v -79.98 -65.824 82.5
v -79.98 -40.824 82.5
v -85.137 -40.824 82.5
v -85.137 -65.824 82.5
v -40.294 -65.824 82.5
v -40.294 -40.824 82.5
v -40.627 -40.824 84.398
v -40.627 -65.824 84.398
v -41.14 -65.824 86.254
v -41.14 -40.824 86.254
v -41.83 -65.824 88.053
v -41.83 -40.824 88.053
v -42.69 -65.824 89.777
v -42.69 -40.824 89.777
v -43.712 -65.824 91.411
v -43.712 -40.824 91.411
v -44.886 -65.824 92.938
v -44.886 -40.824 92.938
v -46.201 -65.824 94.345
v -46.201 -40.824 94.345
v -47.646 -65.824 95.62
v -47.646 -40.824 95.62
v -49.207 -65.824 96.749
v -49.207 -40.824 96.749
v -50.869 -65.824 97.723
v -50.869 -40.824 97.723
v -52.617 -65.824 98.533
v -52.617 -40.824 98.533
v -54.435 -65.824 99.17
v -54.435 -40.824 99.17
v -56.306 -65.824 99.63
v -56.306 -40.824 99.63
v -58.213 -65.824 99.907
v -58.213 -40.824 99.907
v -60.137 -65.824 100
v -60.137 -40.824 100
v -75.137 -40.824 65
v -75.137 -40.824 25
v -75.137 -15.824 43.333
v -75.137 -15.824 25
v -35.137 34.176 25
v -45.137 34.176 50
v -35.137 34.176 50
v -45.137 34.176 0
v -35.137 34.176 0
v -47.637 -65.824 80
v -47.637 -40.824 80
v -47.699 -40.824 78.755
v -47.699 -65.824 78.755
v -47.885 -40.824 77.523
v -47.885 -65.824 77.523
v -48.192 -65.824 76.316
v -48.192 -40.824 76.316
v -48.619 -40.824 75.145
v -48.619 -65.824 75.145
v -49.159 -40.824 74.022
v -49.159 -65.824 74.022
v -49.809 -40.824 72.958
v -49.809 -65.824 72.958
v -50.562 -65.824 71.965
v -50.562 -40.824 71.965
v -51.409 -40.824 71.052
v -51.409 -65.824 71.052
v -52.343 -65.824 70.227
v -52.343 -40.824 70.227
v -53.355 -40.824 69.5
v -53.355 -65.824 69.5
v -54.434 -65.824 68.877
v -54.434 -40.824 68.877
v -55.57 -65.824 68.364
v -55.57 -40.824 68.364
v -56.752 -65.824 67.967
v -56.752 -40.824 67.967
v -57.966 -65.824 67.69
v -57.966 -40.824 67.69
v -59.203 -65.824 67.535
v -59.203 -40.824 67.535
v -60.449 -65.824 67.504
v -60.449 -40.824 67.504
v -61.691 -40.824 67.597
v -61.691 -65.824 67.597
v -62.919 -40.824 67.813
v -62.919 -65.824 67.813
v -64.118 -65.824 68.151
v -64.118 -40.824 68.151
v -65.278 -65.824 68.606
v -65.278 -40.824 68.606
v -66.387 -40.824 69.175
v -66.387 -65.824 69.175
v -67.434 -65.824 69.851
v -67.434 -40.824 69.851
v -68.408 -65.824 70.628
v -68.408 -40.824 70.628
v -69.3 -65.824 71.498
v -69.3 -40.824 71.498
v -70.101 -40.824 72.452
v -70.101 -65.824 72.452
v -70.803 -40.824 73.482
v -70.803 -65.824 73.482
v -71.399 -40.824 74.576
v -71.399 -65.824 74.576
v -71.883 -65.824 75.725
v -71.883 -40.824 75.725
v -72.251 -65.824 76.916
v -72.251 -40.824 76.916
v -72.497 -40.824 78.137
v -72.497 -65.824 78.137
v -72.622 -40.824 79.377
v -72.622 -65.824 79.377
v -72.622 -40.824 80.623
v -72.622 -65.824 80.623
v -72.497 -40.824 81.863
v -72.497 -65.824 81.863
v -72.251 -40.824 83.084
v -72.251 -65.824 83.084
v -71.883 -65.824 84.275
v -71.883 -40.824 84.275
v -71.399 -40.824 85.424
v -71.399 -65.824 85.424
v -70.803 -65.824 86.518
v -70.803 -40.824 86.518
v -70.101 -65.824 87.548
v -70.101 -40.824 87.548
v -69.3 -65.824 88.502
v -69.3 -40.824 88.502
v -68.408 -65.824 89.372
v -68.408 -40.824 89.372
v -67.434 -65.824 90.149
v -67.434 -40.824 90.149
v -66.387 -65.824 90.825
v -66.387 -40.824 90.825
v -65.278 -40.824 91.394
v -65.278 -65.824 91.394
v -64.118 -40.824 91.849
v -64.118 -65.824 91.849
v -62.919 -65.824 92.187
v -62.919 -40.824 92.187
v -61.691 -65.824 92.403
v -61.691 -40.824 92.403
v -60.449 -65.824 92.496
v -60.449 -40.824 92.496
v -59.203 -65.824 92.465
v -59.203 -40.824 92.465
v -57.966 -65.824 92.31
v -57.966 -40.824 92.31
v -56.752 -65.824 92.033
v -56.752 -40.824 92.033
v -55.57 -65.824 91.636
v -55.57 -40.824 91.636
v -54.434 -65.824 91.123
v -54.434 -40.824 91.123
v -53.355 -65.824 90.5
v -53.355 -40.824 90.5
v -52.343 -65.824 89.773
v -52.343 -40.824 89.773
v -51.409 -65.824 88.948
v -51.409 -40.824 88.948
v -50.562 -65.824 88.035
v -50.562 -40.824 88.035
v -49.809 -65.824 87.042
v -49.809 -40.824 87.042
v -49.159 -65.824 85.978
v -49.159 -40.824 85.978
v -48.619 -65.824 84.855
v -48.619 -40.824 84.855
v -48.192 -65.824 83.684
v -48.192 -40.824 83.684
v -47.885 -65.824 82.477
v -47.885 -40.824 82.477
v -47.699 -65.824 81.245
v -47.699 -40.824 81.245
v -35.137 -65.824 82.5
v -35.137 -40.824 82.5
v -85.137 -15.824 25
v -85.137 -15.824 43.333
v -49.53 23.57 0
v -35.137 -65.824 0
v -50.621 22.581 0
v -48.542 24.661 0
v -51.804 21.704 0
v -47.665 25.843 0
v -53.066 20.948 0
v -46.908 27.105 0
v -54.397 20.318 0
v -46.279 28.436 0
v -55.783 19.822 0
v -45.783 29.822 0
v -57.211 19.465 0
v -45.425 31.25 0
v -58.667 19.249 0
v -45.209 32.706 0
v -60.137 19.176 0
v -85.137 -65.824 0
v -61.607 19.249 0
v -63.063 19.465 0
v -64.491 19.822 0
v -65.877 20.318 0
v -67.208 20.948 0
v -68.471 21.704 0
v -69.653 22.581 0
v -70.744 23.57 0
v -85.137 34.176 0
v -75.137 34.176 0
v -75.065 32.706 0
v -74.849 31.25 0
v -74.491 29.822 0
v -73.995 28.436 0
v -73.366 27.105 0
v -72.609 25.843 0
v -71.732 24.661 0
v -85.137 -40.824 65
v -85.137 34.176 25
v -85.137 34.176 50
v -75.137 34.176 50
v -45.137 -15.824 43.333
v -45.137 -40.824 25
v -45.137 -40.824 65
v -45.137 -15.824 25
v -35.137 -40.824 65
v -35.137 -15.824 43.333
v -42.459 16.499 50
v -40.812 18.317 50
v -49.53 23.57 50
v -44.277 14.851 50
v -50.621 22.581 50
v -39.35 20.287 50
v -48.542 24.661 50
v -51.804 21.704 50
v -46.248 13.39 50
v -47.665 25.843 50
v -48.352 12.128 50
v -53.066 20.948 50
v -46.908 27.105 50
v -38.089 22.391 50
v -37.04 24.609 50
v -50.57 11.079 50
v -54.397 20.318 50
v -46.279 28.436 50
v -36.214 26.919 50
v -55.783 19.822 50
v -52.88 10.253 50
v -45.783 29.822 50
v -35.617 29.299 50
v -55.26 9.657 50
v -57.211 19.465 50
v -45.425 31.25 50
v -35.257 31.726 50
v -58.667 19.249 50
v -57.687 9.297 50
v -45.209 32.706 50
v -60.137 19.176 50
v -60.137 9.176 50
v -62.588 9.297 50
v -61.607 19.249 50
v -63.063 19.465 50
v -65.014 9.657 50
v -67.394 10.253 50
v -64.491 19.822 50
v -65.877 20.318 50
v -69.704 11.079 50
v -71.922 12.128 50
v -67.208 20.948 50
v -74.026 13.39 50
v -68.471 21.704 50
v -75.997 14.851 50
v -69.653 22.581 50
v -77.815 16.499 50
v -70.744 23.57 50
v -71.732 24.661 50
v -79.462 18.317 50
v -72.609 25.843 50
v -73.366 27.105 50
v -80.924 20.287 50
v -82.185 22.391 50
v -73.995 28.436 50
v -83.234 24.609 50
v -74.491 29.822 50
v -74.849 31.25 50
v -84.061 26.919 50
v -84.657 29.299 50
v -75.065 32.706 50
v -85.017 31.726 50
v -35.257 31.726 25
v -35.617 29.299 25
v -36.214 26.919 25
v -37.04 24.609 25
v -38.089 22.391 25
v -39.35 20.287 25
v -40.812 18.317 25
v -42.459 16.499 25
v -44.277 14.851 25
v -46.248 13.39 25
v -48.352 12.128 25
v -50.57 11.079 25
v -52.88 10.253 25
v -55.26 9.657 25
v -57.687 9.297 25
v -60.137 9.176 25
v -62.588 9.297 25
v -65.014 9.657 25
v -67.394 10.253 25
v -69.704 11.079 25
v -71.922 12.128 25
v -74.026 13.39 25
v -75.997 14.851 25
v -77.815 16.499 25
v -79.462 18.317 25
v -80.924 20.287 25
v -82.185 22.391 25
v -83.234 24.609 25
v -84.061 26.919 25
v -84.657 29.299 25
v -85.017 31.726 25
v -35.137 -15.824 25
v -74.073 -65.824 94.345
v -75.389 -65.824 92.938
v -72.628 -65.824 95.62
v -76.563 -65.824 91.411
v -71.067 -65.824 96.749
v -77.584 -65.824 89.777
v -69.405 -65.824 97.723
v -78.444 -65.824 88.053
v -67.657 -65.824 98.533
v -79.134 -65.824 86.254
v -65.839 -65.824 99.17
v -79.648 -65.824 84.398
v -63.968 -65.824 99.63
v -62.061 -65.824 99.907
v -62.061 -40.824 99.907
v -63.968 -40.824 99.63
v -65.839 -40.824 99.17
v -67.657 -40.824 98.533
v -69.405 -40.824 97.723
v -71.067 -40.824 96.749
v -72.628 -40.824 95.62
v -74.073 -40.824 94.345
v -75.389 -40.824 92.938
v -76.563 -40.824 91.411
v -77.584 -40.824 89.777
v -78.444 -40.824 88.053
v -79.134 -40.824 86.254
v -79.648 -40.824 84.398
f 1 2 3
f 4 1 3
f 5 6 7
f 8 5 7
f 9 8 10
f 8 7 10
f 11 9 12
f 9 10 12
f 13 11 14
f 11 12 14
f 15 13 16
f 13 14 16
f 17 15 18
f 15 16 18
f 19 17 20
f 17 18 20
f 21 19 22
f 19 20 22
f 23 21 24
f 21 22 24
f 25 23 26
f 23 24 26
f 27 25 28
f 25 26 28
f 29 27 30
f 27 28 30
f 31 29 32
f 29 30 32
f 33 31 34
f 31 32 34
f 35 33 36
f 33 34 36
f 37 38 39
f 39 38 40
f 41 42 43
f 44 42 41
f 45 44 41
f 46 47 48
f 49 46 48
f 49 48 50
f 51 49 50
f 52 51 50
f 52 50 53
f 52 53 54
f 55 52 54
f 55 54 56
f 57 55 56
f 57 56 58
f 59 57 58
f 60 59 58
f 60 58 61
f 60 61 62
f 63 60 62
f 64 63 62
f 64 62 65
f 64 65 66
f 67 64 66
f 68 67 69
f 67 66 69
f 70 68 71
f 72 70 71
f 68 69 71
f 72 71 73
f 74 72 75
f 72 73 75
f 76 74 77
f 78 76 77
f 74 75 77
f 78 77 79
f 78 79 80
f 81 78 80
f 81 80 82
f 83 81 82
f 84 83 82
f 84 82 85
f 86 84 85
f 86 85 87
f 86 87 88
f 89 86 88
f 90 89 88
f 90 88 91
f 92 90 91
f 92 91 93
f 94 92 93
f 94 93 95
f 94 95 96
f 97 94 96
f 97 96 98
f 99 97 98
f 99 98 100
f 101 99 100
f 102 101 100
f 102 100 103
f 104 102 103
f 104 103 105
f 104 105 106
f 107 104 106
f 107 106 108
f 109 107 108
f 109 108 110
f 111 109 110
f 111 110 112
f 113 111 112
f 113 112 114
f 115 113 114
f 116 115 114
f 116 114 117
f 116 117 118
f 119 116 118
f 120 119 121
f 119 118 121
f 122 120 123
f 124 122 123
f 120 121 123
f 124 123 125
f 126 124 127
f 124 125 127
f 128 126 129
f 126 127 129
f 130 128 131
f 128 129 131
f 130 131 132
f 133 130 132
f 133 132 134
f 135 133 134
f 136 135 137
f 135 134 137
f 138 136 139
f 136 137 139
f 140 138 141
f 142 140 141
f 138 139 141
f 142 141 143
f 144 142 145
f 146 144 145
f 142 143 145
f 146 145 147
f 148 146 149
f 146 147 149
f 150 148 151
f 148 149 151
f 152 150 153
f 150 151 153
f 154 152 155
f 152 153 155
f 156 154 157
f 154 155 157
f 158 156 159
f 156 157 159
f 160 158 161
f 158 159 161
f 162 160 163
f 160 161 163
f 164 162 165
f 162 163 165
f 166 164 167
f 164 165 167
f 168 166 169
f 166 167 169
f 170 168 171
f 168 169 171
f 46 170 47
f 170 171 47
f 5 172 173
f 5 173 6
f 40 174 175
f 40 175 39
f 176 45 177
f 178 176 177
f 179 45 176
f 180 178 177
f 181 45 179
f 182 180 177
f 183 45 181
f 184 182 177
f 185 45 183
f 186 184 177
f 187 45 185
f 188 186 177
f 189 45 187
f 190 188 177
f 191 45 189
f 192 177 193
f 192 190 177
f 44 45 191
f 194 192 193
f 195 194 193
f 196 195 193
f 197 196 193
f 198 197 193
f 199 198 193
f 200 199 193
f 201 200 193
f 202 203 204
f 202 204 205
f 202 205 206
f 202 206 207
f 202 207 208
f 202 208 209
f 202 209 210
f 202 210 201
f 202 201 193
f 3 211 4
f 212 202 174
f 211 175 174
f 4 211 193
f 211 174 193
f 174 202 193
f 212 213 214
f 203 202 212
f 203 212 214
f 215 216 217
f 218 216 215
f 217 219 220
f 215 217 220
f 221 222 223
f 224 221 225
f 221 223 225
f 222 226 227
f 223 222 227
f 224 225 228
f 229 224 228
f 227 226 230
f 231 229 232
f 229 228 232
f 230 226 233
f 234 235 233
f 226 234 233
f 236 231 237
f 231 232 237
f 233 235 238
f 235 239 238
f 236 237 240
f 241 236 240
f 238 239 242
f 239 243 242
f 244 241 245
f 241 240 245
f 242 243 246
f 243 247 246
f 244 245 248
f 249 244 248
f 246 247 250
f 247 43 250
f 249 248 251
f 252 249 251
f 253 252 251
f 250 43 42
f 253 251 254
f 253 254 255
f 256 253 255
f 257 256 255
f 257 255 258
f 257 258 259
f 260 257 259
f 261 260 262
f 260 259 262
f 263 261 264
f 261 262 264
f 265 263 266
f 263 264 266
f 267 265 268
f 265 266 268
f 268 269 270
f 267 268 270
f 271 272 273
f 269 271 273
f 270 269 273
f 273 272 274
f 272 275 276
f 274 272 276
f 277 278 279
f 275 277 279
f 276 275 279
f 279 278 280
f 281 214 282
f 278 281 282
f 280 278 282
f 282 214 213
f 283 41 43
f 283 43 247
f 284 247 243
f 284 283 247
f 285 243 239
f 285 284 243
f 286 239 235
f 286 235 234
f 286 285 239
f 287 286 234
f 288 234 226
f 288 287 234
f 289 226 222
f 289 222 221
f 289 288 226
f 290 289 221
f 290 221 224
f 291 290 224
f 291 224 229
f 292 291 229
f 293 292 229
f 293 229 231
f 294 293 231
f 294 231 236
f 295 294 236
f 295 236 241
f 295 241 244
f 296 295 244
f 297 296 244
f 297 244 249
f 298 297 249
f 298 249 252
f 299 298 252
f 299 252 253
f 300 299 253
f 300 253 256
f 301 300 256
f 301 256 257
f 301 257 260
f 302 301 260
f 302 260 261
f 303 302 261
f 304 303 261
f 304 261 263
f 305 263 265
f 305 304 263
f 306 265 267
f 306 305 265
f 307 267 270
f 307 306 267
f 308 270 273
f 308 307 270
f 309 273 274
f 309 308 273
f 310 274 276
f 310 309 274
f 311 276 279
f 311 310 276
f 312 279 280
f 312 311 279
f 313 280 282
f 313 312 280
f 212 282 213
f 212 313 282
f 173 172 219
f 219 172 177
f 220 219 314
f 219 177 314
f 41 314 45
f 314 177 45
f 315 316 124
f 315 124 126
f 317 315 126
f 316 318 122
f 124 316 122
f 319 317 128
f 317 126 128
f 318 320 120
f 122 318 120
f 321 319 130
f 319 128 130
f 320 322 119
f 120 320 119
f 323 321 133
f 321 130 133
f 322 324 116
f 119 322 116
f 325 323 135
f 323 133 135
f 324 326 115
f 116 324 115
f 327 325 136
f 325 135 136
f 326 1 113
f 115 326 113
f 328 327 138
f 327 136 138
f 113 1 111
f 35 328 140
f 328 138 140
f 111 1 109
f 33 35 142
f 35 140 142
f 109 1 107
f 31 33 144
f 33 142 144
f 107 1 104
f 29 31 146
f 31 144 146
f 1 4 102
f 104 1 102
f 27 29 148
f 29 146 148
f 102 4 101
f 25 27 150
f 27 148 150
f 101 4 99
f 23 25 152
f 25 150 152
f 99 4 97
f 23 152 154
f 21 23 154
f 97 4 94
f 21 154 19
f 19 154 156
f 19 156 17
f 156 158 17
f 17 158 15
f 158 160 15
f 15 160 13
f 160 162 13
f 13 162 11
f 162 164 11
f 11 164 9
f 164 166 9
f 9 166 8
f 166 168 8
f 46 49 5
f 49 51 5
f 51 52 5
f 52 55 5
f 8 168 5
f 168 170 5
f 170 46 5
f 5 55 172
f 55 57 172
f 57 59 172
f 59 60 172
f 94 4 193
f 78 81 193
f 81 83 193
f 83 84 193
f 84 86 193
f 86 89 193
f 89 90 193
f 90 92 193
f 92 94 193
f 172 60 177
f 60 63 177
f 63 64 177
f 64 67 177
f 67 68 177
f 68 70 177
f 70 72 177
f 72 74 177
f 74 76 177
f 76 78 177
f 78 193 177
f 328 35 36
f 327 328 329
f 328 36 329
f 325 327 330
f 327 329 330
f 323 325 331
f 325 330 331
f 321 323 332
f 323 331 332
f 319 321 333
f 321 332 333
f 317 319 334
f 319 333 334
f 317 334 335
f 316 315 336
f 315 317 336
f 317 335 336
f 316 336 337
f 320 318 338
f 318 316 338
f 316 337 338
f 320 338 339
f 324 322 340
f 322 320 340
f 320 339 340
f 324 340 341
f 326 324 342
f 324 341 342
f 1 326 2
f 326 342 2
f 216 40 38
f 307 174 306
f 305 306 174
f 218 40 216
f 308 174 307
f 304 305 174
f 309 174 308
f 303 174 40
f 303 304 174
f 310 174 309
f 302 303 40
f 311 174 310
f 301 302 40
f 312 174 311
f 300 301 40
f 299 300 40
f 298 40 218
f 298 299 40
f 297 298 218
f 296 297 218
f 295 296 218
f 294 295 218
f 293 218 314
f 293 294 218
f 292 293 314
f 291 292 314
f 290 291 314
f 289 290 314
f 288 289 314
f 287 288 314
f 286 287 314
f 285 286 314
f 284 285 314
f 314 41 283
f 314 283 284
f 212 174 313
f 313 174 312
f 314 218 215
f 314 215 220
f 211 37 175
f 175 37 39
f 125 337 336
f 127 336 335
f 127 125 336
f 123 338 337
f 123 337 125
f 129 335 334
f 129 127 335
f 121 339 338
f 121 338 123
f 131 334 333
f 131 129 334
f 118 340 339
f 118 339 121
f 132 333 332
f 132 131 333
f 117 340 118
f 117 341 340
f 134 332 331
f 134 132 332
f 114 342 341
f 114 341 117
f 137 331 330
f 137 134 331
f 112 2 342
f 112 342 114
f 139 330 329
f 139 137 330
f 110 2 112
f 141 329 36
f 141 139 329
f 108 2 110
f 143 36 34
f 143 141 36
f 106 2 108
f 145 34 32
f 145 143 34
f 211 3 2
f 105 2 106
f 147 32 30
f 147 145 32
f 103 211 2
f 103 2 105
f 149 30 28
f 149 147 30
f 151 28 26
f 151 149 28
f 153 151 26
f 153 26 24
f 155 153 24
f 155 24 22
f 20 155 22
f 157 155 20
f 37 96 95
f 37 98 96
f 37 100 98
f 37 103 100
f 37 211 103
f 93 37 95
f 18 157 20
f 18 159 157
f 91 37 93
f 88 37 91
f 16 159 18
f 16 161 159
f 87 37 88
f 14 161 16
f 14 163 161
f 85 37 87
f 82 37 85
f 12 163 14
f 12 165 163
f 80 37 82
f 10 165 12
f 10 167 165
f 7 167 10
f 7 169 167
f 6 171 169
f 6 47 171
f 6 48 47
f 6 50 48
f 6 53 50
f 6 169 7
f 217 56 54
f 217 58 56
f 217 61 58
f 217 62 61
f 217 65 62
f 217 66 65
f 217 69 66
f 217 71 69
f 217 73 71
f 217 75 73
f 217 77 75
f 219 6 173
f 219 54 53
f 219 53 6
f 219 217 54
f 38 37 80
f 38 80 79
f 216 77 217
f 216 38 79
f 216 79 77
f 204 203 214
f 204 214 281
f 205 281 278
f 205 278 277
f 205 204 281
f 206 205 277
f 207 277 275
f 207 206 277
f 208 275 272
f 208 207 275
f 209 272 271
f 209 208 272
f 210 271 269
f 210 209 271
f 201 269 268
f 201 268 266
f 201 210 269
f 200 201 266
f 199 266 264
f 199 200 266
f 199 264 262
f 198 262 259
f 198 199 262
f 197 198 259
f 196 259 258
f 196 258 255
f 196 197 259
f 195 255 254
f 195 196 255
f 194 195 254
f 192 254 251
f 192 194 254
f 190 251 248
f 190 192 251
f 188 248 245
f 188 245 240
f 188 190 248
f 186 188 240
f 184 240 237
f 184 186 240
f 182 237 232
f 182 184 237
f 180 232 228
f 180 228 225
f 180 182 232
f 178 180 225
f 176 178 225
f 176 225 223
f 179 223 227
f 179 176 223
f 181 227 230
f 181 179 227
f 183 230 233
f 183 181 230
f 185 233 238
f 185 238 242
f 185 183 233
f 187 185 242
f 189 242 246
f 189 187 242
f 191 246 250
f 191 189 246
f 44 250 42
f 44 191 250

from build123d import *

# Parameters (mm, degrees)
BOSS_EXTRUDE2_DEPTH = 100
SKETCH1_4_W         = 10
SKETCH1_4_H         = 25
BOSS_EXTRUDE3_DEPTH = 65
BOSS_EXTRUDE4_DEPTH = 25
BOSS_EXTRUDE5_DEPTH = 50
SKETCH4_R           = 12.5
CUT_EXTRUDE1_DEPTH  = 56
CUT_EXTRUDE2_DEPTH  = 56


with BuildPart() as part:
    # Sketch1 → Boss-Extrude2 (new body)
    with BuildSketch(Plane.XY):
        Polygon((-85.137096774, -40.82358871), (-85.137096774, -65.82358871), (-35.137096774, -65.82358871), (-35.137096774, -40.82358871), (-45.137096774, -40.82358871), (-75.137096774, -40.82358871), align=None)
    extrude(amount=BOSS_EXTRUDE2_DEPTH)

    # Sketch1<4> → Boss-Extrude3 (add)
    with BuildSketch(Plane.XY):
        with Locations((-80.137096774, -28.32358871)):
            Rectangle(SKETCH1_4_W, SKETCH1_4_H)
        with Locations((-40.137096774, -28.32358871)):
            Rectangle(SKETCH1_4_W, SKETCH1_4_H)
    extrude(amount=BOSS_EXTRUDE3_DEPTH)

    # Sketch1<5> → Boss-Extrude4 (add)
    with BuildSketch(Plane.XY):
        with BuildLine():
            Line((-75.137096774, -15.82358871), (-75.137096774, -40.82358871))
            Line((-75.137096774, -40.82358871), (-45.137096774, -40.82358871))
            Line((-45.137096774, -40.82358871), (-45.137096774, -15.82358871))
            Line((-45.137096774, -15.82358871), (-35.137096774, -15.82358871))
            Line((-35.137096774, -15.82358871), (-35.137096774, 34.17641129))
            ThreePointArc((-35.137096774, 34.17641129), (-60.137096774, 9.17641129), (-85.137096774, 34.17641129))
            Line((-85.137096774, 34.17641129), (-85.137096774, -15.82358871))
            Line((-85.137096774, -15.82358871), (-75.137096774, -15.82358871))
        make_face()
    extrude(amount=BOSS_EXTRUDE4_DEPTH)

    # Sketch1<6> → Boss-Extrude5 (add)
    with BuildSketch(Plane.XY):
        with BuildLine():
            Line((-75.137096774, 34.17641129), (-85.137096774, 34.17641129))
            ThreePointArc((-85.137096774, 34.17641129), (-60.137096774, 9.17641129), (-35.137096774, 34.17641129))
            Line((-35.137096774, 34.17641129), (-45.137096774, 34.17641129))
            ThreePointArc((-45.137096774, 34.17641129), (-60.137096774, 19.17641129), (-75.137096774, 34.17641129))
        make_face()
    extrude(amount=BOSS_EXTRUDE5_DEPTH)

    # Sketch4 → Cut-Extrude1 (cut)
    with BuildSketch(Plane(origin=(0, -40.82358871, 0), x_dir=(1, 0, 0), z_dir=(0, 1, 0))):
        with BuildLine():
            Line((-35.137096774, -100), (-35.137096774, -82.5))
            Line((-35.137096774, -82.5), (-40.293961941, -82.5))
            ThreePointArc((-40.293961941, -82.5), (-46.908340219, -95), (-60.137096774, -100))
            Line((-60.137096774, -100), (-35.137096774, -100))
        make_face()
        with BuildLine():
            Line((-85.137096774, -100), (-60.137096774, -100))
            ThreePointArc((-60.137096774, -100), (-73.36585333, -95), (-79.980231607, -82.5))
            Line((-79.980231607, -82.5), (-85.137096774, -82.5))
            Line((-85.137096774, -82.5), (-85.137096774, -100))
        make_face()
        with Locations((-60.137096774, -80)):
            Circle(SKETCH4_R)
    extrude(amount=-CUT_EXTRUDE1_DEPTH, mode=Mode.SUBTRACT)

    # Sketch7 → Cut-Extrude2 (cut)
    with BuildSketch(Plane(origin=(-35.137096774, 0, 0), x_dir=(0, 0, -1), z_dir=(1, 0, 0))):
        Polygon((-65, -15.82358871), (-65, -40.82358871), (-43.333333333, -15.82358871), align=None)
    extrude(amount=-CUT_EXTRUDE2_DEPTH, mode=Mode.SUBTRACT)


solid = part.part
